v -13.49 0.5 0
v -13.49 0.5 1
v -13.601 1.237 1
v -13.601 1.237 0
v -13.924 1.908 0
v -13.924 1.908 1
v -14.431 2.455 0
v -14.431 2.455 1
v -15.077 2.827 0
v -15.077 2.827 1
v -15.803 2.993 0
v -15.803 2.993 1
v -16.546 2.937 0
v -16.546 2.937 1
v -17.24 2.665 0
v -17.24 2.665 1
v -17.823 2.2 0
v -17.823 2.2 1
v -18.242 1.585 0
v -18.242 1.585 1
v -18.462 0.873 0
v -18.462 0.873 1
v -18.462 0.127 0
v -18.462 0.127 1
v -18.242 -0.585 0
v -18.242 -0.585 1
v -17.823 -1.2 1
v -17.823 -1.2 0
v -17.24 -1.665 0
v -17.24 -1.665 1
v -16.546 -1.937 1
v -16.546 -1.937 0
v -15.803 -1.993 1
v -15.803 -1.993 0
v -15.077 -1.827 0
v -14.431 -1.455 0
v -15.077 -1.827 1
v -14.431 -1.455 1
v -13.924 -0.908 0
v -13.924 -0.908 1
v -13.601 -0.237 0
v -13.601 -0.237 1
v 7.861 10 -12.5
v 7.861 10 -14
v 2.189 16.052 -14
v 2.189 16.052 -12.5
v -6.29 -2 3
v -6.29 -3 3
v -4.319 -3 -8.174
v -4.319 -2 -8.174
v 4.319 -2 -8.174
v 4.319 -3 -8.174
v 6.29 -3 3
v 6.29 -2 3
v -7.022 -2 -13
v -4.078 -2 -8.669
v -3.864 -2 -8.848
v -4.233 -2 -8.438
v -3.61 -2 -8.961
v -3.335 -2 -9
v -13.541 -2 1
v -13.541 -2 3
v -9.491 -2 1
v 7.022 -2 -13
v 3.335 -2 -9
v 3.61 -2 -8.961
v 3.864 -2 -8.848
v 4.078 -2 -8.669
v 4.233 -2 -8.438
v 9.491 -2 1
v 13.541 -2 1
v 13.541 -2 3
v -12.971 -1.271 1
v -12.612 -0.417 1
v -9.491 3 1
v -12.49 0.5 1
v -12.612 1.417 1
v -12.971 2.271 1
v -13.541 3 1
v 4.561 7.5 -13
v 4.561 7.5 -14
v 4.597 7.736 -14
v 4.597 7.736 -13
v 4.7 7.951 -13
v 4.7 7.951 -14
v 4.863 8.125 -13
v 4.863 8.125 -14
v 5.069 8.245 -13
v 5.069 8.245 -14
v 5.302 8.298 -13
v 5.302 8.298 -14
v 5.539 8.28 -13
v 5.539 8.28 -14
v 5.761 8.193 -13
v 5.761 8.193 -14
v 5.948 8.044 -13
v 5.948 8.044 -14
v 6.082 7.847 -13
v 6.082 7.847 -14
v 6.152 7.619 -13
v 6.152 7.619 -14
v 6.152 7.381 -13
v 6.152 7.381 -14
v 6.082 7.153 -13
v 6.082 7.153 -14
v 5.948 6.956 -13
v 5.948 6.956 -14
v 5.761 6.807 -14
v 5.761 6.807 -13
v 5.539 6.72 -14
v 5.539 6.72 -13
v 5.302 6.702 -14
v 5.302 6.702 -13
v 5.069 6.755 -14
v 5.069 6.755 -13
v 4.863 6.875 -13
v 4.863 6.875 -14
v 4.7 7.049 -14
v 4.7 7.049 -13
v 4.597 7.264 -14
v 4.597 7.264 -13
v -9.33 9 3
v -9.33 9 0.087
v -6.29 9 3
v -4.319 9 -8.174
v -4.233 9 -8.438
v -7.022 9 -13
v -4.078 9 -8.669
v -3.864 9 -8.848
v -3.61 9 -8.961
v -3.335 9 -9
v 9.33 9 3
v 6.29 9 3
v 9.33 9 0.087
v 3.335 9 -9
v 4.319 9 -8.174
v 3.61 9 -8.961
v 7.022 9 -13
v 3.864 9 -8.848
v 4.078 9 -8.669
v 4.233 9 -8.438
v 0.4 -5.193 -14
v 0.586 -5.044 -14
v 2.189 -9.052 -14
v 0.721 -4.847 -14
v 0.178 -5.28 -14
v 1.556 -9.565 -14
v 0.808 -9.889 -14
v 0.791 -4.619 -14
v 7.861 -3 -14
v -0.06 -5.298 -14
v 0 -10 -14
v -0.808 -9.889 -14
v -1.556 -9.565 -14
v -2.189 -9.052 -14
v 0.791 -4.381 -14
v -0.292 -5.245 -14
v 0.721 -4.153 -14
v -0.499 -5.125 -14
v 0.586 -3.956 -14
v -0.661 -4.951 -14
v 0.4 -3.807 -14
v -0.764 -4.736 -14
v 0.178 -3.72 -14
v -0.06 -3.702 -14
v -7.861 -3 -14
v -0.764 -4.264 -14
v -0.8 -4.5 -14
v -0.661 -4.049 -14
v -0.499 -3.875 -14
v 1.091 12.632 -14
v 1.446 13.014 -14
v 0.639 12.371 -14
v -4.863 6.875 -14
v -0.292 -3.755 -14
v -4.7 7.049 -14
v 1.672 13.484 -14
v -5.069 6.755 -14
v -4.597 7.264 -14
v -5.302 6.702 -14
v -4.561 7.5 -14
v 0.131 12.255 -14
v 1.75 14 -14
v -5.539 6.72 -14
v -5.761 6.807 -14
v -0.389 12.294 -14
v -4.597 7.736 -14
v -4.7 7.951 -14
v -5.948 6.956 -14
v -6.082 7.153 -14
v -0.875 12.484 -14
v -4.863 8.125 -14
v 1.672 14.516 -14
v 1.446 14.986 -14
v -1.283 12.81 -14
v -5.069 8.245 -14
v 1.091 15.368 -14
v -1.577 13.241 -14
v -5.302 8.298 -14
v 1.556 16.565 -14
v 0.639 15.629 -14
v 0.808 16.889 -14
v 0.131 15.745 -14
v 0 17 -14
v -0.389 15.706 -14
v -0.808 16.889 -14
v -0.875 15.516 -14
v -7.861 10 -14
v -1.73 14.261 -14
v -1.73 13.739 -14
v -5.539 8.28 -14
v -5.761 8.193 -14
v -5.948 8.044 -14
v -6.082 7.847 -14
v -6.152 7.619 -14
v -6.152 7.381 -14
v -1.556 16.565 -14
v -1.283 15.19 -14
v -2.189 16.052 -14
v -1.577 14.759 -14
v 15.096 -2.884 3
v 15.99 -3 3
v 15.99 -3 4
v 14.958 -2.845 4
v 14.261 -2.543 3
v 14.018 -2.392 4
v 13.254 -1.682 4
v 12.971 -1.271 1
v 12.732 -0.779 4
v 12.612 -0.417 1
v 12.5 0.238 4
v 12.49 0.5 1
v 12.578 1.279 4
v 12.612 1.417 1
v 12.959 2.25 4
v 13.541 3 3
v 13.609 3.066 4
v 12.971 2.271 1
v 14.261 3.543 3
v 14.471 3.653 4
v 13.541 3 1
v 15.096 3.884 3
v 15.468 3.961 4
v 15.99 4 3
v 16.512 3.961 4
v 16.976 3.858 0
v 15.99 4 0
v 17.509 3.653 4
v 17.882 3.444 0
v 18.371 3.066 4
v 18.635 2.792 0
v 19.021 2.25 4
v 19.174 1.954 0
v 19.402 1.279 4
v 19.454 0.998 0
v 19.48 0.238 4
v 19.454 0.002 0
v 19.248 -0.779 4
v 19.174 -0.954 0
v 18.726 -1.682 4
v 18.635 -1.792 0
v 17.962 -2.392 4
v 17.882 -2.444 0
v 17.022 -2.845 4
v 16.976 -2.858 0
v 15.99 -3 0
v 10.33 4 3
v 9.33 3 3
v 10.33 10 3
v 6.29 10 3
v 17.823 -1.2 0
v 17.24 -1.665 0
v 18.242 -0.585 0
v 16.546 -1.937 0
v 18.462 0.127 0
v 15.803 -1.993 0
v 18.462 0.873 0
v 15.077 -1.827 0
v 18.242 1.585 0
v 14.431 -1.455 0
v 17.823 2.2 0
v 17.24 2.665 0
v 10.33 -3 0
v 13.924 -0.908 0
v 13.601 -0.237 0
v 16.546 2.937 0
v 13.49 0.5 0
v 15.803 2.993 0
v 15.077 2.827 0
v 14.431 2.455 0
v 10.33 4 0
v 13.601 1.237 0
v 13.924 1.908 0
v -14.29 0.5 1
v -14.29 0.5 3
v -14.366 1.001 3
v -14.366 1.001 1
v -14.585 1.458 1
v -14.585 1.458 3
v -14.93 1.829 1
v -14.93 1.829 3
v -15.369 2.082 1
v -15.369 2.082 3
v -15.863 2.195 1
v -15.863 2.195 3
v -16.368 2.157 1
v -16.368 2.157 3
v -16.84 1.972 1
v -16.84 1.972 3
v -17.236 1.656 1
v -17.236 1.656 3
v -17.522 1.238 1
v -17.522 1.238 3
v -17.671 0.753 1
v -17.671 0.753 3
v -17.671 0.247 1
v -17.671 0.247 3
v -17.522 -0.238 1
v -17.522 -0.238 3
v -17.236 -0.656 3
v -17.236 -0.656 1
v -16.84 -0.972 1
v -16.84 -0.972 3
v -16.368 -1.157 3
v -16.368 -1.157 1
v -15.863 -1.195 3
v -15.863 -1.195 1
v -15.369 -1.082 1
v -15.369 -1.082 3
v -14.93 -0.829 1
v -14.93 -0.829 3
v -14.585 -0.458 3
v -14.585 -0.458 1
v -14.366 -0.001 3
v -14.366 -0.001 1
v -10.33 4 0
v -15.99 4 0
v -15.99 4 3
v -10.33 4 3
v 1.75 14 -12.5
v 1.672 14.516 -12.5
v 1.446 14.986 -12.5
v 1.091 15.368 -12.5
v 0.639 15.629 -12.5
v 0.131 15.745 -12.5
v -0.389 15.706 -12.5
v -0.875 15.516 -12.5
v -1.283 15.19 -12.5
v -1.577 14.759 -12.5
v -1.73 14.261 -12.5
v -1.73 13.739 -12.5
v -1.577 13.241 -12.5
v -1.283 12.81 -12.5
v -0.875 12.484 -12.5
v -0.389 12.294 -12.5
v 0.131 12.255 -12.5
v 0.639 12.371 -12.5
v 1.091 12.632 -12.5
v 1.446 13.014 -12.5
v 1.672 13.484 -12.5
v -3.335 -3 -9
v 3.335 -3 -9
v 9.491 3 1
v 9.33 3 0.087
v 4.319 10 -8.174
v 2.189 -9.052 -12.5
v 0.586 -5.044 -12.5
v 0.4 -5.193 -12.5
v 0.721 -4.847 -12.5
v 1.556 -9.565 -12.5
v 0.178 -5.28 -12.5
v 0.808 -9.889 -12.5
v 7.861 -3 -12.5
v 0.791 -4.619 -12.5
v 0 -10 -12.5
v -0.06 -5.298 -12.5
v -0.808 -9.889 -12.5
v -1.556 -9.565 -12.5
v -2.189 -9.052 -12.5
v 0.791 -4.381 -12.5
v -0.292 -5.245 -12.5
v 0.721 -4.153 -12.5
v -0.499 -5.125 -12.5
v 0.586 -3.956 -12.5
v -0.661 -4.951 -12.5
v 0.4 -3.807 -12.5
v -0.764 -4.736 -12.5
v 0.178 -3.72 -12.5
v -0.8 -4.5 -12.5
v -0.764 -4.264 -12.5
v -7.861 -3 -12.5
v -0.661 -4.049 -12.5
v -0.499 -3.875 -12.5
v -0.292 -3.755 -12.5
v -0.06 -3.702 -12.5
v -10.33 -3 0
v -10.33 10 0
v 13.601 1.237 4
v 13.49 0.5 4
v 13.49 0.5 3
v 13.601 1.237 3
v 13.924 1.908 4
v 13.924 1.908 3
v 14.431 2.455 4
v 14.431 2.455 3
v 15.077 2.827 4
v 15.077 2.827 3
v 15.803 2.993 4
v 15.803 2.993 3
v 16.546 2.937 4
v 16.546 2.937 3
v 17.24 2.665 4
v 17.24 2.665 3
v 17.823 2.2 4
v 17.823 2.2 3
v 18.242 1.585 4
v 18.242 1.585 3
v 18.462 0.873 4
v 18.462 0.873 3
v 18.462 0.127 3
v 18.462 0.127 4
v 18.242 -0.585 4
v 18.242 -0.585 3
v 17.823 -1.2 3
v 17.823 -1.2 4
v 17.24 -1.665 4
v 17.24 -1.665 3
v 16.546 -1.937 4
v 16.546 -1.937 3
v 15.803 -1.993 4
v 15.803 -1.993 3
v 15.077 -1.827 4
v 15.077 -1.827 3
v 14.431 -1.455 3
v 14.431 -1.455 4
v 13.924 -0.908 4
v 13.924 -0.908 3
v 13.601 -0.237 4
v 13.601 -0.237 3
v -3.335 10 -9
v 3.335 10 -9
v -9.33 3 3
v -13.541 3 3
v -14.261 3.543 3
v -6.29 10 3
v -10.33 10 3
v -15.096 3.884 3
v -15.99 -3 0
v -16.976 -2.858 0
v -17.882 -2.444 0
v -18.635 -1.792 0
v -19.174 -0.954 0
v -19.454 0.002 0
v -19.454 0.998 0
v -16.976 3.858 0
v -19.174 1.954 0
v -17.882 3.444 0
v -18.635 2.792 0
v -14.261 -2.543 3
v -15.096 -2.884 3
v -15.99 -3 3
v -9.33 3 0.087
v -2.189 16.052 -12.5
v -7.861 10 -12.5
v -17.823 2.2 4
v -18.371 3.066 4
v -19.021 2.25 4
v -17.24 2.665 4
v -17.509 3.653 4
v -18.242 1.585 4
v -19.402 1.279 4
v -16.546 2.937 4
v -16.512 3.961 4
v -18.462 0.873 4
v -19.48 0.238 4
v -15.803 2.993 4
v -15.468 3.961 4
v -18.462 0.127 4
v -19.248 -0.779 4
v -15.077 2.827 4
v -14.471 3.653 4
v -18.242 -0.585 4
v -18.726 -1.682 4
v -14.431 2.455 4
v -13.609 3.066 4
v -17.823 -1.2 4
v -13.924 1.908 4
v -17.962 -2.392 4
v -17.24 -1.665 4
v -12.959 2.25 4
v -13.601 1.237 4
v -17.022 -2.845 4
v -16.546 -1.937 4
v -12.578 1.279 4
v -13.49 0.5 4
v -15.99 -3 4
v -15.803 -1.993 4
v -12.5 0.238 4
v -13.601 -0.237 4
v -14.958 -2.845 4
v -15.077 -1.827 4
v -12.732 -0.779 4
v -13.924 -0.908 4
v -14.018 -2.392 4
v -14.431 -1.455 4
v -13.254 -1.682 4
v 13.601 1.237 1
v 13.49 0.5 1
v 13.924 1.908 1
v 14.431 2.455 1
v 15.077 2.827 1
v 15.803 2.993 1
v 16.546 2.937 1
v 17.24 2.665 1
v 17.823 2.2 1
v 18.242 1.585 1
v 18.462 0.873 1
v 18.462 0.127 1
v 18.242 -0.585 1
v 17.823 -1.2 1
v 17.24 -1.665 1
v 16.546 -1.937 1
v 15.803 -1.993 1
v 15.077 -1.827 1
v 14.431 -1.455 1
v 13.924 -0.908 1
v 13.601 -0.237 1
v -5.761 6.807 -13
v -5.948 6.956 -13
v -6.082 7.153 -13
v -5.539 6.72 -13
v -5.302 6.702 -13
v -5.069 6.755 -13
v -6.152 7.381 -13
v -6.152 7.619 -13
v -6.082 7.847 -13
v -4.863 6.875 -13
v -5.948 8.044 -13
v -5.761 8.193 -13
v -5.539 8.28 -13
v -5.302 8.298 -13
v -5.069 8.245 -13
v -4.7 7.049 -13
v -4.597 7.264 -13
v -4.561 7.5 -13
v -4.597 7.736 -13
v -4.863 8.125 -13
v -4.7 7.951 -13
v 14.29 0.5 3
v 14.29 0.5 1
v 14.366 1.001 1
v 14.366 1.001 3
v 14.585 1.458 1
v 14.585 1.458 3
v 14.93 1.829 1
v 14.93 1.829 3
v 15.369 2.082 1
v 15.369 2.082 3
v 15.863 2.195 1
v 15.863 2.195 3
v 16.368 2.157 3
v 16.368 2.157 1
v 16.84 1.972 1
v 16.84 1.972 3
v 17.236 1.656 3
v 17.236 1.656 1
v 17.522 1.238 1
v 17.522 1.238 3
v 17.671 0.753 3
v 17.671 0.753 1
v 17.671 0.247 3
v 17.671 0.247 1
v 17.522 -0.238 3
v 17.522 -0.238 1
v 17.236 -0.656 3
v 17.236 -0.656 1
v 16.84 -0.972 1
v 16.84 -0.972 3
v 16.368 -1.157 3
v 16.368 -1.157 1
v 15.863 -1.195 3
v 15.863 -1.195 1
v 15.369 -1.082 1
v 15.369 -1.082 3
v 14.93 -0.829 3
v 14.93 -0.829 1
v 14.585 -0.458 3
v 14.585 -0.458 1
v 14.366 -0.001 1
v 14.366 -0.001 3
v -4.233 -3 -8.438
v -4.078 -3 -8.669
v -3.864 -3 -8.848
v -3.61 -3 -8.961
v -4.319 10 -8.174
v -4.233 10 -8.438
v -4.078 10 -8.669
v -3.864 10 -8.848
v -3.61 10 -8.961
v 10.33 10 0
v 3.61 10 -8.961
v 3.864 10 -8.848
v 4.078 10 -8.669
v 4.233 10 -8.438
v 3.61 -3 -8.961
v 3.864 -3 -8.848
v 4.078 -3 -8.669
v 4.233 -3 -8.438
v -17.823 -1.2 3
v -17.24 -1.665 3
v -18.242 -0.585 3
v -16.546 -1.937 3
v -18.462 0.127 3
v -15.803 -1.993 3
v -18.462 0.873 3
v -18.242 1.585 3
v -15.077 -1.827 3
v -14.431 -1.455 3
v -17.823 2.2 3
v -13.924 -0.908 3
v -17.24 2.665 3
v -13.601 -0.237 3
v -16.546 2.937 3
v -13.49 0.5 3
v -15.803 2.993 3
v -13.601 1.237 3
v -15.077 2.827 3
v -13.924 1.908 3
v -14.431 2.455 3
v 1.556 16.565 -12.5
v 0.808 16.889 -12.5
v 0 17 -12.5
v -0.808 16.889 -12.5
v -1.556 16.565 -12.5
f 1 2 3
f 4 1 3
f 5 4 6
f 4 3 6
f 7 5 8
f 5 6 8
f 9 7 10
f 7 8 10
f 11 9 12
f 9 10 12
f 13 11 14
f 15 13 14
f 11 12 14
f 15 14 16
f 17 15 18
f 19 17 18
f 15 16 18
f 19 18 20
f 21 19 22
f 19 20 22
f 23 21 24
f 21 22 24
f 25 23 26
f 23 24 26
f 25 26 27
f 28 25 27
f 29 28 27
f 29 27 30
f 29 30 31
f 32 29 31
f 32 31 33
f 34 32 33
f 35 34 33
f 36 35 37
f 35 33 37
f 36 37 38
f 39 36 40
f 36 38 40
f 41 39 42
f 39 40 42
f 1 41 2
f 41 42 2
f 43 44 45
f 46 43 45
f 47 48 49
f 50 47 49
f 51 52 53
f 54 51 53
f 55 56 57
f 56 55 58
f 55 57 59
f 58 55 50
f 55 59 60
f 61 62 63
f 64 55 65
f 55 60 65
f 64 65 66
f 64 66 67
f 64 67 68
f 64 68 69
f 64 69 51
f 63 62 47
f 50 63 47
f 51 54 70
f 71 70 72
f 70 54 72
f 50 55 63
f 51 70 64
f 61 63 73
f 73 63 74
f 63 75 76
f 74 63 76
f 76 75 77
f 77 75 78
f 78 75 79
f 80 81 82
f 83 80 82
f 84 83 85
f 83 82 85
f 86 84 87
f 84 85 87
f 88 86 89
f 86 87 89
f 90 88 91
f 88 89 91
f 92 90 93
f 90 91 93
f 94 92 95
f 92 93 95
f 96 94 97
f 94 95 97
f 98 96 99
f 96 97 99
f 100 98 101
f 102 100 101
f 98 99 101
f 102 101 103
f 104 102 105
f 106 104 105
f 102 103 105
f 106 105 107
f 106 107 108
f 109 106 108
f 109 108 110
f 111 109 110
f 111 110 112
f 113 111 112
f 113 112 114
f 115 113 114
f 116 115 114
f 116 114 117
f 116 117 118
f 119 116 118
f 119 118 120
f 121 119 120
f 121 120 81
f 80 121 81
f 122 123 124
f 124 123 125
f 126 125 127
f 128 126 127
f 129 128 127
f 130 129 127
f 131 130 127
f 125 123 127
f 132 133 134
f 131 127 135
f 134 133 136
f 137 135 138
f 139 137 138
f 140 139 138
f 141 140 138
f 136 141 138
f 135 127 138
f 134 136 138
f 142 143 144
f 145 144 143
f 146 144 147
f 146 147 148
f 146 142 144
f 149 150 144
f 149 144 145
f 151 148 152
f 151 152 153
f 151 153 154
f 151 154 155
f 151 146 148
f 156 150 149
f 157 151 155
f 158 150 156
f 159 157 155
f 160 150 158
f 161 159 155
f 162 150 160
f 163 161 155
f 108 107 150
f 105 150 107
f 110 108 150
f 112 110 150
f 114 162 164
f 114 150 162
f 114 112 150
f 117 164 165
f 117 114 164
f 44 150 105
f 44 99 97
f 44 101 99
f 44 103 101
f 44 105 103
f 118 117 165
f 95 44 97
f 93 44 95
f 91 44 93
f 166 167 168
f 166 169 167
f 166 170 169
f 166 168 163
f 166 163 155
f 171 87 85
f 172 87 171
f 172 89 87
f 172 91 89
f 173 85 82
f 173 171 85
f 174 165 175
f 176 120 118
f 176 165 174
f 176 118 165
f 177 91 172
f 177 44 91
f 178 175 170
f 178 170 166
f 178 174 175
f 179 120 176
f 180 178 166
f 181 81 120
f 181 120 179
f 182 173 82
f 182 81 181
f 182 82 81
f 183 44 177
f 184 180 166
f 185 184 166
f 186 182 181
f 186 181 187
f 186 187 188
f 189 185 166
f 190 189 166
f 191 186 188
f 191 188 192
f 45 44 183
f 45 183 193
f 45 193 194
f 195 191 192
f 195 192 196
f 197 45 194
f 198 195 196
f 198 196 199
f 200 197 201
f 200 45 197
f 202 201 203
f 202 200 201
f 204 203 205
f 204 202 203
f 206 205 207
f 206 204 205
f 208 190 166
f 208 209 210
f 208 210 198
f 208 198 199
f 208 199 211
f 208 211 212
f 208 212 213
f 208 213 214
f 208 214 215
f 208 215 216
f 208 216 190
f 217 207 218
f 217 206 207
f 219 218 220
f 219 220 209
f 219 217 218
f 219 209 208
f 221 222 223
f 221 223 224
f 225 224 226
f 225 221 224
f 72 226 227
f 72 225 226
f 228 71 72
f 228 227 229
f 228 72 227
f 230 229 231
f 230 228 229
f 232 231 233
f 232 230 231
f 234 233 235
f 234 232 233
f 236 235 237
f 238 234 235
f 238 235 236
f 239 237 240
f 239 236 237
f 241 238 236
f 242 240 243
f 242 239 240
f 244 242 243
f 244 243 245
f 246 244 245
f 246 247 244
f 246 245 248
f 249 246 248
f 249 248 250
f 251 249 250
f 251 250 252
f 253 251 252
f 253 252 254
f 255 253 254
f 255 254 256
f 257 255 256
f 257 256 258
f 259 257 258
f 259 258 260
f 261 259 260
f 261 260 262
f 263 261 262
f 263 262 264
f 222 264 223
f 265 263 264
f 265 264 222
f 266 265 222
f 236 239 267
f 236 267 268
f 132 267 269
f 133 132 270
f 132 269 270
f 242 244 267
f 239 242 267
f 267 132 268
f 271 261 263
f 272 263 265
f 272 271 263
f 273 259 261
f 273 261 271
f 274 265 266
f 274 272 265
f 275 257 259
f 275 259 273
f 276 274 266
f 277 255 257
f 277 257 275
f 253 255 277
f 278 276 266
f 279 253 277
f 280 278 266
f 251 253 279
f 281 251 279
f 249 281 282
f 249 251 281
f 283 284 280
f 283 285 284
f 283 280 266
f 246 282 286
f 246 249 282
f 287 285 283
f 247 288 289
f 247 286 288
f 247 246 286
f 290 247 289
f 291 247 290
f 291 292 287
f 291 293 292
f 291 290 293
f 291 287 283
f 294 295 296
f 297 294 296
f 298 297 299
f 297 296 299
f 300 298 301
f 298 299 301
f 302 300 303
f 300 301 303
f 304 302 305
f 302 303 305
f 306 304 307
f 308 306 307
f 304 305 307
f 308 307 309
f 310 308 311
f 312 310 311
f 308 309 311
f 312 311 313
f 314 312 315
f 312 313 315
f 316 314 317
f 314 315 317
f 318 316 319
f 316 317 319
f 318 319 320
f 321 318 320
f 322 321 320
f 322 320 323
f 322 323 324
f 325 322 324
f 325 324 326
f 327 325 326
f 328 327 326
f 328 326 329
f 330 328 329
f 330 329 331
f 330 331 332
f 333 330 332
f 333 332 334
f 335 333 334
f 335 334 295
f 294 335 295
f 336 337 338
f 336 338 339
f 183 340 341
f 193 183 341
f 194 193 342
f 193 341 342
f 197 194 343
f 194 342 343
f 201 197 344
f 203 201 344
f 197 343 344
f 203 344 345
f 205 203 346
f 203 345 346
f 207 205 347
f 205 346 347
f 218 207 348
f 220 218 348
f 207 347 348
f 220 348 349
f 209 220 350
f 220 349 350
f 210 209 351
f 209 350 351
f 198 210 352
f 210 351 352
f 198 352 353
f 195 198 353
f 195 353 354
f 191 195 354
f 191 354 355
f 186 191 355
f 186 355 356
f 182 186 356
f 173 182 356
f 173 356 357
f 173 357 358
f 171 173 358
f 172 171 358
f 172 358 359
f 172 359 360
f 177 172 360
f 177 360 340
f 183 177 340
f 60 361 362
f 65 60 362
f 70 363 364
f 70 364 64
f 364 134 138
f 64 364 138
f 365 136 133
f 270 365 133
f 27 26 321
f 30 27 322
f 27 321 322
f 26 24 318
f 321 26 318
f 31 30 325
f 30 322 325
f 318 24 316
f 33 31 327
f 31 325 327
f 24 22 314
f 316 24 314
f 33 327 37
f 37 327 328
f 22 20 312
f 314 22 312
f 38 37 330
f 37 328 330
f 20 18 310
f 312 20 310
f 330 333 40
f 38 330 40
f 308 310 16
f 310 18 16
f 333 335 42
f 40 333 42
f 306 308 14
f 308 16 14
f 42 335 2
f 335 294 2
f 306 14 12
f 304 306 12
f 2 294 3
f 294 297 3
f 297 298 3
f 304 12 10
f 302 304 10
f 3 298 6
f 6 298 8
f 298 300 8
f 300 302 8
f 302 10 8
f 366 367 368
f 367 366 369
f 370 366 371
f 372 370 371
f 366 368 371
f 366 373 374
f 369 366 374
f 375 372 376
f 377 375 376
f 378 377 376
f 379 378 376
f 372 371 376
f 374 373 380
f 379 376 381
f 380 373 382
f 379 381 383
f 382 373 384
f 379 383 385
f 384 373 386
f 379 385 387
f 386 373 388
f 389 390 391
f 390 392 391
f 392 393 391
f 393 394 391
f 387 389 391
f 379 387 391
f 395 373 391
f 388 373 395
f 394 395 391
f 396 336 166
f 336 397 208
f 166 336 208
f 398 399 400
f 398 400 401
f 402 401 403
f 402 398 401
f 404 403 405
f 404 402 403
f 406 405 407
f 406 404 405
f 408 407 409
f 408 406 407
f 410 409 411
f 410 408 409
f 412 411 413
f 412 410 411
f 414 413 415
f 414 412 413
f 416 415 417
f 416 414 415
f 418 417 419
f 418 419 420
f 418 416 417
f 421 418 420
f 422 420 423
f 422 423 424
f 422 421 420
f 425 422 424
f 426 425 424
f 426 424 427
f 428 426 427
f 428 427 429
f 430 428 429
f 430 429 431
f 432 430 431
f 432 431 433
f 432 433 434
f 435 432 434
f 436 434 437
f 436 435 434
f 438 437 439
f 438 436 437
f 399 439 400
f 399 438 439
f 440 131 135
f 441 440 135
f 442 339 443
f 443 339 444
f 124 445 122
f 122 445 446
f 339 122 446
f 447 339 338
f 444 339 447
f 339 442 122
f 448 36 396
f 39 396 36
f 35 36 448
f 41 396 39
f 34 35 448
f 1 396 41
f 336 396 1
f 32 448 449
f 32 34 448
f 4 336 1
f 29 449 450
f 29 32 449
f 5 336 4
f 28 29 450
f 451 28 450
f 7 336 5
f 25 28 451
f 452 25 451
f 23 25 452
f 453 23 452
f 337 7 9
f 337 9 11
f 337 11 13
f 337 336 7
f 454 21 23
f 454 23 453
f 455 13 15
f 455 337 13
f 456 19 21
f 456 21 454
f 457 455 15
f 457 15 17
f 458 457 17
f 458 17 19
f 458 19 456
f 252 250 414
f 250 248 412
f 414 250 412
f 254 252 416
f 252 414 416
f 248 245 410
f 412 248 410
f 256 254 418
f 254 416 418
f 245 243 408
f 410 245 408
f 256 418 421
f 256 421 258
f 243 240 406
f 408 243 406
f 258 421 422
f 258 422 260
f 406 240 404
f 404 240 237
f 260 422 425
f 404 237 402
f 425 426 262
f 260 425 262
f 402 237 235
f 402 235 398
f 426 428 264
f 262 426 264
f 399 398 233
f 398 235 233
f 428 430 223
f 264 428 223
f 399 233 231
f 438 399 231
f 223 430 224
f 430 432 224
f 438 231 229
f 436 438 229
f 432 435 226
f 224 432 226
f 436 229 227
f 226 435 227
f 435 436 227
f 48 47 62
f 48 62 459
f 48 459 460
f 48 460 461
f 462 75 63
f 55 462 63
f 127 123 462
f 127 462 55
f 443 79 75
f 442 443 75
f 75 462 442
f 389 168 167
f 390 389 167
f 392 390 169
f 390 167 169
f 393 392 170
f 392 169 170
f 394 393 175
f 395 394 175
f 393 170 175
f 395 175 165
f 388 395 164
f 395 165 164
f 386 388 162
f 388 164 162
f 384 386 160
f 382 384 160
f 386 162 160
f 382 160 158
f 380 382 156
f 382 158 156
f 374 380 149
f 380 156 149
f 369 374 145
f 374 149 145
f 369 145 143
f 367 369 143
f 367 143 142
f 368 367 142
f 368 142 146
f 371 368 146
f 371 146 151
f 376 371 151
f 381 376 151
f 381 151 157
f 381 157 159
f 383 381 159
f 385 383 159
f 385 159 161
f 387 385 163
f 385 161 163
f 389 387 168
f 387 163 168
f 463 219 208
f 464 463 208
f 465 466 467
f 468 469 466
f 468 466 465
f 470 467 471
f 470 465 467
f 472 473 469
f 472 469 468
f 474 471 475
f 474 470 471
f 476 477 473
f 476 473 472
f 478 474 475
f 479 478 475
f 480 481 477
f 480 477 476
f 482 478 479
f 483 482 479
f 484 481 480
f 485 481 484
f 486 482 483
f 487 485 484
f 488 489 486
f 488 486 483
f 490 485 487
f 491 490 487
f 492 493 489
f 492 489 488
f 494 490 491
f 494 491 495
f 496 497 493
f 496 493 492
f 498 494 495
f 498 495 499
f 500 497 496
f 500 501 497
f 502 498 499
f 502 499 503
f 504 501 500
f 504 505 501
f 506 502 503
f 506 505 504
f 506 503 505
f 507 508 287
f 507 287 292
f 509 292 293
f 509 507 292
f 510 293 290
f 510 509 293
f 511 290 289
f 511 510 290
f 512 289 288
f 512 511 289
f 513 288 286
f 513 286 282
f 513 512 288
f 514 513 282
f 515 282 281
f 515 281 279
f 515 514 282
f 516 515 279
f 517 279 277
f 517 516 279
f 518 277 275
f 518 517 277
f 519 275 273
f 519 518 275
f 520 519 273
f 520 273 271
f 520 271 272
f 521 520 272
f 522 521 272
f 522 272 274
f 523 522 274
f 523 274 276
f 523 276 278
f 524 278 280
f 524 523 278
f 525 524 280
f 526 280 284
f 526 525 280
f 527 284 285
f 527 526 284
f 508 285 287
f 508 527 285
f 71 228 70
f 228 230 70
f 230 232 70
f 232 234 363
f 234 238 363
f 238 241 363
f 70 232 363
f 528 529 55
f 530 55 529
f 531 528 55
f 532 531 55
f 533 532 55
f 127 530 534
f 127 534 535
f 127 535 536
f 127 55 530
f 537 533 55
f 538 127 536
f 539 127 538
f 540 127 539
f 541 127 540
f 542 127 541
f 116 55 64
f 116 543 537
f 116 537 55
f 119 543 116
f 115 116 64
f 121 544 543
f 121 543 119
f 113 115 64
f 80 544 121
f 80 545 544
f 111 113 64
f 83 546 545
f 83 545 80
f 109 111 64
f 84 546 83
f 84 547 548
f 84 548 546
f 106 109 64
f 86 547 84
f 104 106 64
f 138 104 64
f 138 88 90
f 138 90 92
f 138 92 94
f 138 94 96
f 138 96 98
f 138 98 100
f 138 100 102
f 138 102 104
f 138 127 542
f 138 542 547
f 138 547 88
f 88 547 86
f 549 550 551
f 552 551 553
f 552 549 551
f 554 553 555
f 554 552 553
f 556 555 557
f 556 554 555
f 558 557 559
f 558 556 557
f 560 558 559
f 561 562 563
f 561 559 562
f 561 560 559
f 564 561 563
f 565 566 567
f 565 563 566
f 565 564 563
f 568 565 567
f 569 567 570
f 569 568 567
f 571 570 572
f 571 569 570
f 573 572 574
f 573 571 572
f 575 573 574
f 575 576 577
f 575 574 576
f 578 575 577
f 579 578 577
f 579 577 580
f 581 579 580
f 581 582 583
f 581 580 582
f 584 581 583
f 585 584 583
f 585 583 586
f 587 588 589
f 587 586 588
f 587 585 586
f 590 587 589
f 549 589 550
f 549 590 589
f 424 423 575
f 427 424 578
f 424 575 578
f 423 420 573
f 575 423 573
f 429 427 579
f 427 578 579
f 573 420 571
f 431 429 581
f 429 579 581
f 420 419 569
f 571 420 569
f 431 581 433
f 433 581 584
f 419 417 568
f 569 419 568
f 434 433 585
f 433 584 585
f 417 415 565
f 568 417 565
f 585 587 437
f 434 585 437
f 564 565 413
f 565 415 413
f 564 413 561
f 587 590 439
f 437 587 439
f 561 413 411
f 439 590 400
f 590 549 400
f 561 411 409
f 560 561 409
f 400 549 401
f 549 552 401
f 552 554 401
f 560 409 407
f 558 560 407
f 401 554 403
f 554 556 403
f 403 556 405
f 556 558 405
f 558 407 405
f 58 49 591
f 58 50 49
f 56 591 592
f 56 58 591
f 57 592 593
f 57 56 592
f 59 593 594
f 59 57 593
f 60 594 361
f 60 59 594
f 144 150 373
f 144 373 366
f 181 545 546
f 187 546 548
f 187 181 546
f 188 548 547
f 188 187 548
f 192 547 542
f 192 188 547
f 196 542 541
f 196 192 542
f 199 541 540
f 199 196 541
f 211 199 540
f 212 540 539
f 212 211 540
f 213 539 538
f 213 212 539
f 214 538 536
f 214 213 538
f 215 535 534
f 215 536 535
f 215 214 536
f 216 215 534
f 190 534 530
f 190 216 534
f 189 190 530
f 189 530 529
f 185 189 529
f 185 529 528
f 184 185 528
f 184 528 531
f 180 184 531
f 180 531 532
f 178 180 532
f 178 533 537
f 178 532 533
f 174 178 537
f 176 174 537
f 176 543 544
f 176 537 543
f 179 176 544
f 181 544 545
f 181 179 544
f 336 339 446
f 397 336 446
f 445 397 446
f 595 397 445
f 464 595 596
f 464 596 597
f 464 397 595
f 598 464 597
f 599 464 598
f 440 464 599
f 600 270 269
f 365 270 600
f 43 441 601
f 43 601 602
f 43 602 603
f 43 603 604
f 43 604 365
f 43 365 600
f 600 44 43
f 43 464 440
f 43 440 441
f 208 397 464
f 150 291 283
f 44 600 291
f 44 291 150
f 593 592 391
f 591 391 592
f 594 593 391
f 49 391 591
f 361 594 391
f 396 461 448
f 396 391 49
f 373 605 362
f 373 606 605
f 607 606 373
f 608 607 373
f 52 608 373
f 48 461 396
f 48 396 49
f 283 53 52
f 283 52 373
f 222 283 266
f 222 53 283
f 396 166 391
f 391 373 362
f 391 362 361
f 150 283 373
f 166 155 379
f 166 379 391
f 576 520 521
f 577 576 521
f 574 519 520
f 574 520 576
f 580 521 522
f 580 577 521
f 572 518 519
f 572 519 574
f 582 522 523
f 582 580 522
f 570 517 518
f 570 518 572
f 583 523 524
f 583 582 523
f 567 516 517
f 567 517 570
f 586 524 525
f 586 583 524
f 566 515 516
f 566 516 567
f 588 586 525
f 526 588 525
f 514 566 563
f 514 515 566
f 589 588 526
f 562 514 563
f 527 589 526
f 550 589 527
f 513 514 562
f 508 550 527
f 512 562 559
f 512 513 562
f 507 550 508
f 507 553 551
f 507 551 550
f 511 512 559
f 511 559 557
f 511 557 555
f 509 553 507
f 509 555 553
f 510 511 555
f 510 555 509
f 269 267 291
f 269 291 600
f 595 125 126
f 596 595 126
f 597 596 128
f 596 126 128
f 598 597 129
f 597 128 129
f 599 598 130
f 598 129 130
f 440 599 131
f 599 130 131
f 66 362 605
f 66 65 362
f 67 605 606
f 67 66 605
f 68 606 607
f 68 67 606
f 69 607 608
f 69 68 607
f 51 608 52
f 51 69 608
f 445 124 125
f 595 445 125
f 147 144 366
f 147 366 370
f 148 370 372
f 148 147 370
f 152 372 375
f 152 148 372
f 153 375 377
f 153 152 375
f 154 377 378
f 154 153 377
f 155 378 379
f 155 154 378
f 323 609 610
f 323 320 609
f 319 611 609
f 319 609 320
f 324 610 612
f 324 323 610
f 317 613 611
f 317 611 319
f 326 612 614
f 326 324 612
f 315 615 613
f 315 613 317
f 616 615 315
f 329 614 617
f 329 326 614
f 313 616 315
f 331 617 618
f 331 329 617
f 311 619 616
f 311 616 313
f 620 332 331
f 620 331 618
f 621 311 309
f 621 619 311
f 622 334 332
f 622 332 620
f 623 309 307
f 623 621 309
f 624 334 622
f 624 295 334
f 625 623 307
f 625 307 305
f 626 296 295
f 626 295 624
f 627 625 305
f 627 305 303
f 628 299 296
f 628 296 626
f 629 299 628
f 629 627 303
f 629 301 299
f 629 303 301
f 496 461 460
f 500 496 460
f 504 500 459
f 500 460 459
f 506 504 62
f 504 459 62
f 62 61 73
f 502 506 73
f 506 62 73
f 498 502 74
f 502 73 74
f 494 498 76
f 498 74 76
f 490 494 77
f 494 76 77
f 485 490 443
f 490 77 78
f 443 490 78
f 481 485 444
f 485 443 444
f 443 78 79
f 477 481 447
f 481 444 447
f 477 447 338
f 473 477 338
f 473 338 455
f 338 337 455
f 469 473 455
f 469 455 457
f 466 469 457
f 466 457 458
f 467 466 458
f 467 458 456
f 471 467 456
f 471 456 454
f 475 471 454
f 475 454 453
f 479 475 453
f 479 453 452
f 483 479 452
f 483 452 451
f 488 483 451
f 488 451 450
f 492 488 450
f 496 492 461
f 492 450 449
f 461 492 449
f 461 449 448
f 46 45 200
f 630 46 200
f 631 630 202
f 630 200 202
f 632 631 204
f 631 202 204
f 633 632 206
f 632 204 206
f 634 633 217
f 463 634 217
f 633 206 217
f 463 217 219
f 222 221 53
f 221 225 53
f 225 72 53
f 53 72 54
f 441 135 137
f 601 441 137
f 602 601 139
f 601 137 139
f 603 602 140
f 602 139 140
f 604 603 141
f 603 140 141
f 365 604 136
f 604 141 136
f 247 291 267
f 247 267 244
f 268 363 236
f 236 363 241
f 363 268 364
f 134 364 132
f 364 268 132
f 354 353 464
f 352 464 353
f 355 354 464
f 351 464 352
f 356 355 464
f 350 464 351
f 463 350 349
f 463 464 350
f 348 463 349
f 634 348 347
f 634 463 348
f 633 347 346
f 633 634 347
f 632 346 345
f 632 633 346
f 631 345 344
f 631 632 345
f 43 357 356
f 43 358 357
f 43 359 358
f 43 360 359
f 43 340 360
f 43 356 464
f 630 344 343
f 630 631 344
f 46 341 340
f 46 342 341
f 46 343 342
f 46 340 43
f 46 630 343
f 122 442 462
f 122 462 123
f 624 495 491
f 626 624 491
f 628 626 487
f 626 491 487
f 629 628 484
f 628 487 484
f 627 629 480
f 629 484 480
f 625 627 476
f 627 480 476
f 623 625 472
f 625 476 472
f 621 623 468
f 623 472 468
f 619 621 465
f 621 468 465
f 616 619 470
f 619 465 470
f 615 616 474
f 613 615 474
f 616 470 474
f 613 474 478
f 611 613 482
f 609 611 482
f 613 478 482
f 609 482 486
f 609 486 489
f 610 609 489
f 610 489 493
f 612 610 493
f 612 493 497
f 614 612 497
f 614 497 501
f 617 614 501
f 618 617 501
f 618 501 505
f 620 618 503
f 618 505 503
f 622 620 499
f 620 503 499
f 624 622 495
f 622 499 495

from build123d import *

# Parameters (mm, degrees)
ESTRUSIONE_ESTRUSIONE1_DEPTH = 3
SCHIZZO2_W                   = 20.66
SCHIZZO2_H                   = 13
ESTRUSIONE_ESTRUSIONE2_DEPTH = 14
TAGLIO_ESTRUSIONE1_DEPTH     = 25.91345219
SVUOTA1_T                    = -1
SCHIZZO4_R                   = 3.5
ESTRUSIONE_ESTRUSIONE3_DEPTH = 4
SCHIZZO5_R                   = 2.5
TAGLIO_ESTRUSIONE2_DEPTH     = 1
SCHIZZO6_R                   = 1.7
TAGLIO_ESTRUSIONE3_DEPTH     = 28.728326671
ESTRUSIONE_ESTRUSIONE4_DEPTH = 1.5
SCHIZZO8_R                   = 1.75
TAGLIO_ESTRUSIONE4_DEPTH     = 31.677517827
SCHIZZO9_R                   = 0.8
TAGLIO_ESTRUSIONE5_DEPTH     = 1.5
TAGLIO_ESTRUSIONE6_DEPTH     = 32.238759578
RACCORDO1_R                  = 1
SPECCHIA12_START             = 9
SPECCHIA12_DEPTH             = 1
RACCORDO2_R                  = 1
SPECCHIA15_START             = 9
SPECCHIA15_DEPTH             = 1
SCHIZZO12_R                  = 0.8
ESTRUSIONE_ESTRUSIONE5_DEPTH = 1.5
TAGLIO_ESTRUSIONE7_START     = -1
SCHIZZO13_R                  = 2.5
TAGLIO_ESTRUSIONE7_DEPTH     = 1


# Read off the part's stored shape, not the designer's step: Specchia12, Specchia15
with BuildPart() as part:
    # Schizzo1 → Estrusione-Estrusione1 (new body)
    with BuildSketch(Plane.XY):
        Polygon((-15.99, 4), (-10.33, 4), (-10.33, 10), (10.33, 10), (10.33, 4), (15.99, 4), (15.99, -3), (-15.99, -3), align=None)
    extrude(amount=ESTRUSIONE_ESTRUSIONE1_DEPTH)

    # Schizzo2 → Estrusione-Estrusione2 (add)
    with BuildSketch(Plane.XY):
        with Locations((0, 3.5)):
            Rectangle(SCHIZZO2_W, SCHIZZO2_H)
    extrude(amount=-ESTRUSIONE_ESTRUSIONE2_DEPTH)

    # Schizzo3 → Taglio-Estrusione1 (cut, through all)
    with BuildSketch(Plane(origin=(0, 10, 0), x_dir=(1, 0, 0), z_dir=(0, 1, 0))):
        Polygon((-10.33, 0), (-7.86142227, 14), (-10.33, 14), align=None)
    taglio_estrusione1 = extrude(amount=-TAGLIO_ESTRUSIONE1_DEPTH, mode=Mode.SUBTRACT)

    # Specchia1: Taglio-Estrusione1 across plane
    add(taglio_estrusione1.mirror(Plane(origin=(0, 0, 0), x_dir=(0, 0, 1), z_dir=(1, 0, 0))), mode=Mode.SUBTRACT)

    # Svuota1
    svuota1_openings = [part.faces().sort_by_distance(p)[0] for p in [
        (0, 2.81654304, 3),
    ]]
    offset(amount=SVUOTA1_T, openings=svuota1_openings, kind=Kind.INTERSECTION)

    # Schizzo4 → Estrusione-Estrusione3 (add)
    with BuildSketch(Plane.XY):
        with Locations(Location((-15.99, 0.5, 0), (0, 0, 270))):
            Circle(SCHIZZO4_R)
    estrusione_estrusione3 = extrude(amount=ESTRUSIONE_ESTRUSIONE3_DEPTH)

    # Schizzo5 → Taglio-Estrusione2 (cut)
    with BuildSketch(Plane.XY.offset(4)):
        with Locations((-15.99, 0.5)):
            Circle(SCHIZZO5_R)
    taglio_estrusione2 = extrude(amount=-TAGLIO_ESTRUSIONE2_DEPTH, mode=Mode.SUBTRACT)

    # Schizzo6 → Taglio-Estrusione3 (cut, through all)
    with BuildSketch(Plane.XY.offset(3)):
        with Locations((-15.99, 0.5)):
            Circle(SCHIZZO6_R)
    taglio_estrusione3 = extrude(amount=-TAGLIO_ESTRUSIONE3_DEPTH, mode=Mode.SUBTRACT)

    # Specchia2: Estrusione-Estrusione3, Taglio-Estrusione2, Taglio-Estrusione3 across plane
    add(estrusione_estrusione3.mirror(Plane(origin=(0, 0, 0), x_dir=(0, 0, 1), z_dir=(1, 0, 0))))
    add(taglio_estrusione2.mirror(Plane(origin=(0, 0, 0), x_dir=(0, 0, 1), z_dir=(1, 0, 0))), mode=Mode.SUBTRACT)
    add(taglio_estrusione3.mirror(Plane(origin=(0, 0, 0), x_dir=(0, 0, 1), z_dir=(1, 0, 0))), mode=Mode.SUBTRACT)

    # Schizzo7 → Estrusione-Estrusione4 (add)
    with BuildSketch(Plane(origin=(0, 0, -14), x_dir=(-1, 0, 0), z_dir=(0, 0, -1))):
        with BuildLine():
            Line((-7.86142227, 10), (-2.188751242, 16.051674439))
            ThreePointArc((-2.188751242, 16.051674439), (0, 17), (2.188751242, 16.051674439))
            Line((2.188751242, 16.051674439), (7.86142227, 10))
            Line((7.86142227, 10), (-7.86142227, 10))
        make_face()
    extrude(amount=-ESTRUSIONE_ESTRUSIONE4_DEPTH)

    # Schizzo8 → Taglio-Estrusione4 (cut, through all)
    with BuildSketch(Plane.XY.offset(-12.5)):
        with Locations((0, 14)):
            Circle(SCHIZZO8_R)
    extrude(amount=-TAGLIO_ESTRUSIONE4_DEPTH, mode=Mode.SUBTRACT)

    # Schizzo9 → Taglio-Estrusione5 (cut)
    with BuildSketch(Plane(origin=(0, 0, -14), x_dir=(-1, 0, 0), z_dir=(0, 0, -1))):
        with Locations((-5.36142227, 7.5)):
            Circle(SCHIZZO9_R)
    taglio_estrusione5 = extrude(amount=-TAGLIO_ESTRUSIONE5_DEPTH, mode=Mode.SUBTRACT)

    # Specchia5: Taglio-Estrusione5 across plane
    add(taglio_estrusione5.mirror(Plane(origin=(0, 0, 0), x_dir=(0, 0, 1), z_dir=(1, 0, 0))), mode=Mode.SUBTRACT)

    # Schizzo10 → Taglio-Estrusione6 (cut, through all)
    with BuildSketch(Plane.XZ.offset(3)):
        Polygon((-6.289561189, 3), (-4.17363742, -9), (4.17363742, -9), (6.289561189, 3), align=None)
    extrude(amount=-TAGLIO_ESTRUSIONE6_DEPTH, mode=Mode.SUBTRACT)

    # Raccordo1
    raccordo1_edges = [part.edges().sort_by_distance(p)[0] for p in [
        (-4.17363742, -2.5, -9),
    ]]
    fillet(raccordo1_edges, radius=RACCORDO1_R)

    # Specchia12 outline → Specchia12 (add)
    with BuildSketch(Plane(origin=(0, 0, 0), x_dir=(1, 0, 0), z_dir=(0, 1, 0)).offset(SPECCHIA12_START)):
        with BuildLine():
            ThreePointArc((-4.319345542, 8.173648178), (-3.977325399, 8.766044443), (-3.334537789, 9))
            Line((-3.334537789, 9), (-4.17363742, 9))
            Line((-4.17363742, 9), (-4.319345542, 8.173648178))
        make_face()
    extrude(amount=SPECCHIA12_DEPTH)

    # Raccordo2
    raccordo2_edges = [part.edges().sort_by_distance(p)[0] for p in [
        (4.17363742, -2.5, -9),
    ]]
    fillet(raccordo2_edges, radius=RACCORDO2_R)

    # Specchia15 outline → Specchia15 (add)
    with BuildSketch(Plane(origin=(0, 0, 0), x_dir=(1, 0, 0), z_dir=(0, 1, 0)).offset(SPECCHIA15_START)):
        with BuildLine():
            ThreePointArc((3.334537789, 9), (3.977325399, 8.766044443), (4.319345542, 8.173648178))
            Line((4.319345542, 8.173648178), (4.17363742, 9))
            Line((4.17363742, 9), (3.334537789, 9))
        make_face()
    extrude(amount=SPECCHIA15_DEPTH)

    # Schizzo12 → Estrusione-Estrusione5 (add)
    with BuildSketch(Plane(origin=(0, 0, -14), x_dir=(-1, 0, 0), z_dir=(0, 0, -1))):
        with BuildLine():
            Line((-7.86142227, -3), (-2.188751242, -9.051674439))
            ThreePointArc((-2.188751242, -9.051674439), (0, -10), (2.188751242, -9.051674439))
            Line((2.188751242, -9.051674439), (7.86142227, -3))
            Line((7.86142227, -3), (-7.86142227, -3))
        make_face()
        with Locations((0, -4.5)):
            Circle(SCHIZZO12_R, mode=Mode.SUBTRACT)
    extrude(amount=-ESTRUSIONE_ESTRUSIONE5_DEPTH)

    # Schizzo13 → Taglio-Estrusione7 (cut)
    with BuildSketch(Plane(origin=(0, 0, 0), x_dir=(-1, 0, 0), z_dir=(0, 0, -1)).offset(TAGLIO_ESTRUSIONE7_START)):
        with Locations((-15.99, 0.5)):
            Circle(SCHIZZO13_R)
    taglio_estrusione7 = extrude(amount=TAGLIO_ESTRUSIONE7_DEPTH, mode=Mode.SUBTRACT)

    # Specchia16: Taglio-Estrusione7 across plane
    add(taglio_estrusione7.mirror(Plane(origin=(0, 0, 0), x_dir=(0, 0, 1), z_dir=(1, 0, 0))), mode=Mode.SUBTRACT)


solid = part.part
